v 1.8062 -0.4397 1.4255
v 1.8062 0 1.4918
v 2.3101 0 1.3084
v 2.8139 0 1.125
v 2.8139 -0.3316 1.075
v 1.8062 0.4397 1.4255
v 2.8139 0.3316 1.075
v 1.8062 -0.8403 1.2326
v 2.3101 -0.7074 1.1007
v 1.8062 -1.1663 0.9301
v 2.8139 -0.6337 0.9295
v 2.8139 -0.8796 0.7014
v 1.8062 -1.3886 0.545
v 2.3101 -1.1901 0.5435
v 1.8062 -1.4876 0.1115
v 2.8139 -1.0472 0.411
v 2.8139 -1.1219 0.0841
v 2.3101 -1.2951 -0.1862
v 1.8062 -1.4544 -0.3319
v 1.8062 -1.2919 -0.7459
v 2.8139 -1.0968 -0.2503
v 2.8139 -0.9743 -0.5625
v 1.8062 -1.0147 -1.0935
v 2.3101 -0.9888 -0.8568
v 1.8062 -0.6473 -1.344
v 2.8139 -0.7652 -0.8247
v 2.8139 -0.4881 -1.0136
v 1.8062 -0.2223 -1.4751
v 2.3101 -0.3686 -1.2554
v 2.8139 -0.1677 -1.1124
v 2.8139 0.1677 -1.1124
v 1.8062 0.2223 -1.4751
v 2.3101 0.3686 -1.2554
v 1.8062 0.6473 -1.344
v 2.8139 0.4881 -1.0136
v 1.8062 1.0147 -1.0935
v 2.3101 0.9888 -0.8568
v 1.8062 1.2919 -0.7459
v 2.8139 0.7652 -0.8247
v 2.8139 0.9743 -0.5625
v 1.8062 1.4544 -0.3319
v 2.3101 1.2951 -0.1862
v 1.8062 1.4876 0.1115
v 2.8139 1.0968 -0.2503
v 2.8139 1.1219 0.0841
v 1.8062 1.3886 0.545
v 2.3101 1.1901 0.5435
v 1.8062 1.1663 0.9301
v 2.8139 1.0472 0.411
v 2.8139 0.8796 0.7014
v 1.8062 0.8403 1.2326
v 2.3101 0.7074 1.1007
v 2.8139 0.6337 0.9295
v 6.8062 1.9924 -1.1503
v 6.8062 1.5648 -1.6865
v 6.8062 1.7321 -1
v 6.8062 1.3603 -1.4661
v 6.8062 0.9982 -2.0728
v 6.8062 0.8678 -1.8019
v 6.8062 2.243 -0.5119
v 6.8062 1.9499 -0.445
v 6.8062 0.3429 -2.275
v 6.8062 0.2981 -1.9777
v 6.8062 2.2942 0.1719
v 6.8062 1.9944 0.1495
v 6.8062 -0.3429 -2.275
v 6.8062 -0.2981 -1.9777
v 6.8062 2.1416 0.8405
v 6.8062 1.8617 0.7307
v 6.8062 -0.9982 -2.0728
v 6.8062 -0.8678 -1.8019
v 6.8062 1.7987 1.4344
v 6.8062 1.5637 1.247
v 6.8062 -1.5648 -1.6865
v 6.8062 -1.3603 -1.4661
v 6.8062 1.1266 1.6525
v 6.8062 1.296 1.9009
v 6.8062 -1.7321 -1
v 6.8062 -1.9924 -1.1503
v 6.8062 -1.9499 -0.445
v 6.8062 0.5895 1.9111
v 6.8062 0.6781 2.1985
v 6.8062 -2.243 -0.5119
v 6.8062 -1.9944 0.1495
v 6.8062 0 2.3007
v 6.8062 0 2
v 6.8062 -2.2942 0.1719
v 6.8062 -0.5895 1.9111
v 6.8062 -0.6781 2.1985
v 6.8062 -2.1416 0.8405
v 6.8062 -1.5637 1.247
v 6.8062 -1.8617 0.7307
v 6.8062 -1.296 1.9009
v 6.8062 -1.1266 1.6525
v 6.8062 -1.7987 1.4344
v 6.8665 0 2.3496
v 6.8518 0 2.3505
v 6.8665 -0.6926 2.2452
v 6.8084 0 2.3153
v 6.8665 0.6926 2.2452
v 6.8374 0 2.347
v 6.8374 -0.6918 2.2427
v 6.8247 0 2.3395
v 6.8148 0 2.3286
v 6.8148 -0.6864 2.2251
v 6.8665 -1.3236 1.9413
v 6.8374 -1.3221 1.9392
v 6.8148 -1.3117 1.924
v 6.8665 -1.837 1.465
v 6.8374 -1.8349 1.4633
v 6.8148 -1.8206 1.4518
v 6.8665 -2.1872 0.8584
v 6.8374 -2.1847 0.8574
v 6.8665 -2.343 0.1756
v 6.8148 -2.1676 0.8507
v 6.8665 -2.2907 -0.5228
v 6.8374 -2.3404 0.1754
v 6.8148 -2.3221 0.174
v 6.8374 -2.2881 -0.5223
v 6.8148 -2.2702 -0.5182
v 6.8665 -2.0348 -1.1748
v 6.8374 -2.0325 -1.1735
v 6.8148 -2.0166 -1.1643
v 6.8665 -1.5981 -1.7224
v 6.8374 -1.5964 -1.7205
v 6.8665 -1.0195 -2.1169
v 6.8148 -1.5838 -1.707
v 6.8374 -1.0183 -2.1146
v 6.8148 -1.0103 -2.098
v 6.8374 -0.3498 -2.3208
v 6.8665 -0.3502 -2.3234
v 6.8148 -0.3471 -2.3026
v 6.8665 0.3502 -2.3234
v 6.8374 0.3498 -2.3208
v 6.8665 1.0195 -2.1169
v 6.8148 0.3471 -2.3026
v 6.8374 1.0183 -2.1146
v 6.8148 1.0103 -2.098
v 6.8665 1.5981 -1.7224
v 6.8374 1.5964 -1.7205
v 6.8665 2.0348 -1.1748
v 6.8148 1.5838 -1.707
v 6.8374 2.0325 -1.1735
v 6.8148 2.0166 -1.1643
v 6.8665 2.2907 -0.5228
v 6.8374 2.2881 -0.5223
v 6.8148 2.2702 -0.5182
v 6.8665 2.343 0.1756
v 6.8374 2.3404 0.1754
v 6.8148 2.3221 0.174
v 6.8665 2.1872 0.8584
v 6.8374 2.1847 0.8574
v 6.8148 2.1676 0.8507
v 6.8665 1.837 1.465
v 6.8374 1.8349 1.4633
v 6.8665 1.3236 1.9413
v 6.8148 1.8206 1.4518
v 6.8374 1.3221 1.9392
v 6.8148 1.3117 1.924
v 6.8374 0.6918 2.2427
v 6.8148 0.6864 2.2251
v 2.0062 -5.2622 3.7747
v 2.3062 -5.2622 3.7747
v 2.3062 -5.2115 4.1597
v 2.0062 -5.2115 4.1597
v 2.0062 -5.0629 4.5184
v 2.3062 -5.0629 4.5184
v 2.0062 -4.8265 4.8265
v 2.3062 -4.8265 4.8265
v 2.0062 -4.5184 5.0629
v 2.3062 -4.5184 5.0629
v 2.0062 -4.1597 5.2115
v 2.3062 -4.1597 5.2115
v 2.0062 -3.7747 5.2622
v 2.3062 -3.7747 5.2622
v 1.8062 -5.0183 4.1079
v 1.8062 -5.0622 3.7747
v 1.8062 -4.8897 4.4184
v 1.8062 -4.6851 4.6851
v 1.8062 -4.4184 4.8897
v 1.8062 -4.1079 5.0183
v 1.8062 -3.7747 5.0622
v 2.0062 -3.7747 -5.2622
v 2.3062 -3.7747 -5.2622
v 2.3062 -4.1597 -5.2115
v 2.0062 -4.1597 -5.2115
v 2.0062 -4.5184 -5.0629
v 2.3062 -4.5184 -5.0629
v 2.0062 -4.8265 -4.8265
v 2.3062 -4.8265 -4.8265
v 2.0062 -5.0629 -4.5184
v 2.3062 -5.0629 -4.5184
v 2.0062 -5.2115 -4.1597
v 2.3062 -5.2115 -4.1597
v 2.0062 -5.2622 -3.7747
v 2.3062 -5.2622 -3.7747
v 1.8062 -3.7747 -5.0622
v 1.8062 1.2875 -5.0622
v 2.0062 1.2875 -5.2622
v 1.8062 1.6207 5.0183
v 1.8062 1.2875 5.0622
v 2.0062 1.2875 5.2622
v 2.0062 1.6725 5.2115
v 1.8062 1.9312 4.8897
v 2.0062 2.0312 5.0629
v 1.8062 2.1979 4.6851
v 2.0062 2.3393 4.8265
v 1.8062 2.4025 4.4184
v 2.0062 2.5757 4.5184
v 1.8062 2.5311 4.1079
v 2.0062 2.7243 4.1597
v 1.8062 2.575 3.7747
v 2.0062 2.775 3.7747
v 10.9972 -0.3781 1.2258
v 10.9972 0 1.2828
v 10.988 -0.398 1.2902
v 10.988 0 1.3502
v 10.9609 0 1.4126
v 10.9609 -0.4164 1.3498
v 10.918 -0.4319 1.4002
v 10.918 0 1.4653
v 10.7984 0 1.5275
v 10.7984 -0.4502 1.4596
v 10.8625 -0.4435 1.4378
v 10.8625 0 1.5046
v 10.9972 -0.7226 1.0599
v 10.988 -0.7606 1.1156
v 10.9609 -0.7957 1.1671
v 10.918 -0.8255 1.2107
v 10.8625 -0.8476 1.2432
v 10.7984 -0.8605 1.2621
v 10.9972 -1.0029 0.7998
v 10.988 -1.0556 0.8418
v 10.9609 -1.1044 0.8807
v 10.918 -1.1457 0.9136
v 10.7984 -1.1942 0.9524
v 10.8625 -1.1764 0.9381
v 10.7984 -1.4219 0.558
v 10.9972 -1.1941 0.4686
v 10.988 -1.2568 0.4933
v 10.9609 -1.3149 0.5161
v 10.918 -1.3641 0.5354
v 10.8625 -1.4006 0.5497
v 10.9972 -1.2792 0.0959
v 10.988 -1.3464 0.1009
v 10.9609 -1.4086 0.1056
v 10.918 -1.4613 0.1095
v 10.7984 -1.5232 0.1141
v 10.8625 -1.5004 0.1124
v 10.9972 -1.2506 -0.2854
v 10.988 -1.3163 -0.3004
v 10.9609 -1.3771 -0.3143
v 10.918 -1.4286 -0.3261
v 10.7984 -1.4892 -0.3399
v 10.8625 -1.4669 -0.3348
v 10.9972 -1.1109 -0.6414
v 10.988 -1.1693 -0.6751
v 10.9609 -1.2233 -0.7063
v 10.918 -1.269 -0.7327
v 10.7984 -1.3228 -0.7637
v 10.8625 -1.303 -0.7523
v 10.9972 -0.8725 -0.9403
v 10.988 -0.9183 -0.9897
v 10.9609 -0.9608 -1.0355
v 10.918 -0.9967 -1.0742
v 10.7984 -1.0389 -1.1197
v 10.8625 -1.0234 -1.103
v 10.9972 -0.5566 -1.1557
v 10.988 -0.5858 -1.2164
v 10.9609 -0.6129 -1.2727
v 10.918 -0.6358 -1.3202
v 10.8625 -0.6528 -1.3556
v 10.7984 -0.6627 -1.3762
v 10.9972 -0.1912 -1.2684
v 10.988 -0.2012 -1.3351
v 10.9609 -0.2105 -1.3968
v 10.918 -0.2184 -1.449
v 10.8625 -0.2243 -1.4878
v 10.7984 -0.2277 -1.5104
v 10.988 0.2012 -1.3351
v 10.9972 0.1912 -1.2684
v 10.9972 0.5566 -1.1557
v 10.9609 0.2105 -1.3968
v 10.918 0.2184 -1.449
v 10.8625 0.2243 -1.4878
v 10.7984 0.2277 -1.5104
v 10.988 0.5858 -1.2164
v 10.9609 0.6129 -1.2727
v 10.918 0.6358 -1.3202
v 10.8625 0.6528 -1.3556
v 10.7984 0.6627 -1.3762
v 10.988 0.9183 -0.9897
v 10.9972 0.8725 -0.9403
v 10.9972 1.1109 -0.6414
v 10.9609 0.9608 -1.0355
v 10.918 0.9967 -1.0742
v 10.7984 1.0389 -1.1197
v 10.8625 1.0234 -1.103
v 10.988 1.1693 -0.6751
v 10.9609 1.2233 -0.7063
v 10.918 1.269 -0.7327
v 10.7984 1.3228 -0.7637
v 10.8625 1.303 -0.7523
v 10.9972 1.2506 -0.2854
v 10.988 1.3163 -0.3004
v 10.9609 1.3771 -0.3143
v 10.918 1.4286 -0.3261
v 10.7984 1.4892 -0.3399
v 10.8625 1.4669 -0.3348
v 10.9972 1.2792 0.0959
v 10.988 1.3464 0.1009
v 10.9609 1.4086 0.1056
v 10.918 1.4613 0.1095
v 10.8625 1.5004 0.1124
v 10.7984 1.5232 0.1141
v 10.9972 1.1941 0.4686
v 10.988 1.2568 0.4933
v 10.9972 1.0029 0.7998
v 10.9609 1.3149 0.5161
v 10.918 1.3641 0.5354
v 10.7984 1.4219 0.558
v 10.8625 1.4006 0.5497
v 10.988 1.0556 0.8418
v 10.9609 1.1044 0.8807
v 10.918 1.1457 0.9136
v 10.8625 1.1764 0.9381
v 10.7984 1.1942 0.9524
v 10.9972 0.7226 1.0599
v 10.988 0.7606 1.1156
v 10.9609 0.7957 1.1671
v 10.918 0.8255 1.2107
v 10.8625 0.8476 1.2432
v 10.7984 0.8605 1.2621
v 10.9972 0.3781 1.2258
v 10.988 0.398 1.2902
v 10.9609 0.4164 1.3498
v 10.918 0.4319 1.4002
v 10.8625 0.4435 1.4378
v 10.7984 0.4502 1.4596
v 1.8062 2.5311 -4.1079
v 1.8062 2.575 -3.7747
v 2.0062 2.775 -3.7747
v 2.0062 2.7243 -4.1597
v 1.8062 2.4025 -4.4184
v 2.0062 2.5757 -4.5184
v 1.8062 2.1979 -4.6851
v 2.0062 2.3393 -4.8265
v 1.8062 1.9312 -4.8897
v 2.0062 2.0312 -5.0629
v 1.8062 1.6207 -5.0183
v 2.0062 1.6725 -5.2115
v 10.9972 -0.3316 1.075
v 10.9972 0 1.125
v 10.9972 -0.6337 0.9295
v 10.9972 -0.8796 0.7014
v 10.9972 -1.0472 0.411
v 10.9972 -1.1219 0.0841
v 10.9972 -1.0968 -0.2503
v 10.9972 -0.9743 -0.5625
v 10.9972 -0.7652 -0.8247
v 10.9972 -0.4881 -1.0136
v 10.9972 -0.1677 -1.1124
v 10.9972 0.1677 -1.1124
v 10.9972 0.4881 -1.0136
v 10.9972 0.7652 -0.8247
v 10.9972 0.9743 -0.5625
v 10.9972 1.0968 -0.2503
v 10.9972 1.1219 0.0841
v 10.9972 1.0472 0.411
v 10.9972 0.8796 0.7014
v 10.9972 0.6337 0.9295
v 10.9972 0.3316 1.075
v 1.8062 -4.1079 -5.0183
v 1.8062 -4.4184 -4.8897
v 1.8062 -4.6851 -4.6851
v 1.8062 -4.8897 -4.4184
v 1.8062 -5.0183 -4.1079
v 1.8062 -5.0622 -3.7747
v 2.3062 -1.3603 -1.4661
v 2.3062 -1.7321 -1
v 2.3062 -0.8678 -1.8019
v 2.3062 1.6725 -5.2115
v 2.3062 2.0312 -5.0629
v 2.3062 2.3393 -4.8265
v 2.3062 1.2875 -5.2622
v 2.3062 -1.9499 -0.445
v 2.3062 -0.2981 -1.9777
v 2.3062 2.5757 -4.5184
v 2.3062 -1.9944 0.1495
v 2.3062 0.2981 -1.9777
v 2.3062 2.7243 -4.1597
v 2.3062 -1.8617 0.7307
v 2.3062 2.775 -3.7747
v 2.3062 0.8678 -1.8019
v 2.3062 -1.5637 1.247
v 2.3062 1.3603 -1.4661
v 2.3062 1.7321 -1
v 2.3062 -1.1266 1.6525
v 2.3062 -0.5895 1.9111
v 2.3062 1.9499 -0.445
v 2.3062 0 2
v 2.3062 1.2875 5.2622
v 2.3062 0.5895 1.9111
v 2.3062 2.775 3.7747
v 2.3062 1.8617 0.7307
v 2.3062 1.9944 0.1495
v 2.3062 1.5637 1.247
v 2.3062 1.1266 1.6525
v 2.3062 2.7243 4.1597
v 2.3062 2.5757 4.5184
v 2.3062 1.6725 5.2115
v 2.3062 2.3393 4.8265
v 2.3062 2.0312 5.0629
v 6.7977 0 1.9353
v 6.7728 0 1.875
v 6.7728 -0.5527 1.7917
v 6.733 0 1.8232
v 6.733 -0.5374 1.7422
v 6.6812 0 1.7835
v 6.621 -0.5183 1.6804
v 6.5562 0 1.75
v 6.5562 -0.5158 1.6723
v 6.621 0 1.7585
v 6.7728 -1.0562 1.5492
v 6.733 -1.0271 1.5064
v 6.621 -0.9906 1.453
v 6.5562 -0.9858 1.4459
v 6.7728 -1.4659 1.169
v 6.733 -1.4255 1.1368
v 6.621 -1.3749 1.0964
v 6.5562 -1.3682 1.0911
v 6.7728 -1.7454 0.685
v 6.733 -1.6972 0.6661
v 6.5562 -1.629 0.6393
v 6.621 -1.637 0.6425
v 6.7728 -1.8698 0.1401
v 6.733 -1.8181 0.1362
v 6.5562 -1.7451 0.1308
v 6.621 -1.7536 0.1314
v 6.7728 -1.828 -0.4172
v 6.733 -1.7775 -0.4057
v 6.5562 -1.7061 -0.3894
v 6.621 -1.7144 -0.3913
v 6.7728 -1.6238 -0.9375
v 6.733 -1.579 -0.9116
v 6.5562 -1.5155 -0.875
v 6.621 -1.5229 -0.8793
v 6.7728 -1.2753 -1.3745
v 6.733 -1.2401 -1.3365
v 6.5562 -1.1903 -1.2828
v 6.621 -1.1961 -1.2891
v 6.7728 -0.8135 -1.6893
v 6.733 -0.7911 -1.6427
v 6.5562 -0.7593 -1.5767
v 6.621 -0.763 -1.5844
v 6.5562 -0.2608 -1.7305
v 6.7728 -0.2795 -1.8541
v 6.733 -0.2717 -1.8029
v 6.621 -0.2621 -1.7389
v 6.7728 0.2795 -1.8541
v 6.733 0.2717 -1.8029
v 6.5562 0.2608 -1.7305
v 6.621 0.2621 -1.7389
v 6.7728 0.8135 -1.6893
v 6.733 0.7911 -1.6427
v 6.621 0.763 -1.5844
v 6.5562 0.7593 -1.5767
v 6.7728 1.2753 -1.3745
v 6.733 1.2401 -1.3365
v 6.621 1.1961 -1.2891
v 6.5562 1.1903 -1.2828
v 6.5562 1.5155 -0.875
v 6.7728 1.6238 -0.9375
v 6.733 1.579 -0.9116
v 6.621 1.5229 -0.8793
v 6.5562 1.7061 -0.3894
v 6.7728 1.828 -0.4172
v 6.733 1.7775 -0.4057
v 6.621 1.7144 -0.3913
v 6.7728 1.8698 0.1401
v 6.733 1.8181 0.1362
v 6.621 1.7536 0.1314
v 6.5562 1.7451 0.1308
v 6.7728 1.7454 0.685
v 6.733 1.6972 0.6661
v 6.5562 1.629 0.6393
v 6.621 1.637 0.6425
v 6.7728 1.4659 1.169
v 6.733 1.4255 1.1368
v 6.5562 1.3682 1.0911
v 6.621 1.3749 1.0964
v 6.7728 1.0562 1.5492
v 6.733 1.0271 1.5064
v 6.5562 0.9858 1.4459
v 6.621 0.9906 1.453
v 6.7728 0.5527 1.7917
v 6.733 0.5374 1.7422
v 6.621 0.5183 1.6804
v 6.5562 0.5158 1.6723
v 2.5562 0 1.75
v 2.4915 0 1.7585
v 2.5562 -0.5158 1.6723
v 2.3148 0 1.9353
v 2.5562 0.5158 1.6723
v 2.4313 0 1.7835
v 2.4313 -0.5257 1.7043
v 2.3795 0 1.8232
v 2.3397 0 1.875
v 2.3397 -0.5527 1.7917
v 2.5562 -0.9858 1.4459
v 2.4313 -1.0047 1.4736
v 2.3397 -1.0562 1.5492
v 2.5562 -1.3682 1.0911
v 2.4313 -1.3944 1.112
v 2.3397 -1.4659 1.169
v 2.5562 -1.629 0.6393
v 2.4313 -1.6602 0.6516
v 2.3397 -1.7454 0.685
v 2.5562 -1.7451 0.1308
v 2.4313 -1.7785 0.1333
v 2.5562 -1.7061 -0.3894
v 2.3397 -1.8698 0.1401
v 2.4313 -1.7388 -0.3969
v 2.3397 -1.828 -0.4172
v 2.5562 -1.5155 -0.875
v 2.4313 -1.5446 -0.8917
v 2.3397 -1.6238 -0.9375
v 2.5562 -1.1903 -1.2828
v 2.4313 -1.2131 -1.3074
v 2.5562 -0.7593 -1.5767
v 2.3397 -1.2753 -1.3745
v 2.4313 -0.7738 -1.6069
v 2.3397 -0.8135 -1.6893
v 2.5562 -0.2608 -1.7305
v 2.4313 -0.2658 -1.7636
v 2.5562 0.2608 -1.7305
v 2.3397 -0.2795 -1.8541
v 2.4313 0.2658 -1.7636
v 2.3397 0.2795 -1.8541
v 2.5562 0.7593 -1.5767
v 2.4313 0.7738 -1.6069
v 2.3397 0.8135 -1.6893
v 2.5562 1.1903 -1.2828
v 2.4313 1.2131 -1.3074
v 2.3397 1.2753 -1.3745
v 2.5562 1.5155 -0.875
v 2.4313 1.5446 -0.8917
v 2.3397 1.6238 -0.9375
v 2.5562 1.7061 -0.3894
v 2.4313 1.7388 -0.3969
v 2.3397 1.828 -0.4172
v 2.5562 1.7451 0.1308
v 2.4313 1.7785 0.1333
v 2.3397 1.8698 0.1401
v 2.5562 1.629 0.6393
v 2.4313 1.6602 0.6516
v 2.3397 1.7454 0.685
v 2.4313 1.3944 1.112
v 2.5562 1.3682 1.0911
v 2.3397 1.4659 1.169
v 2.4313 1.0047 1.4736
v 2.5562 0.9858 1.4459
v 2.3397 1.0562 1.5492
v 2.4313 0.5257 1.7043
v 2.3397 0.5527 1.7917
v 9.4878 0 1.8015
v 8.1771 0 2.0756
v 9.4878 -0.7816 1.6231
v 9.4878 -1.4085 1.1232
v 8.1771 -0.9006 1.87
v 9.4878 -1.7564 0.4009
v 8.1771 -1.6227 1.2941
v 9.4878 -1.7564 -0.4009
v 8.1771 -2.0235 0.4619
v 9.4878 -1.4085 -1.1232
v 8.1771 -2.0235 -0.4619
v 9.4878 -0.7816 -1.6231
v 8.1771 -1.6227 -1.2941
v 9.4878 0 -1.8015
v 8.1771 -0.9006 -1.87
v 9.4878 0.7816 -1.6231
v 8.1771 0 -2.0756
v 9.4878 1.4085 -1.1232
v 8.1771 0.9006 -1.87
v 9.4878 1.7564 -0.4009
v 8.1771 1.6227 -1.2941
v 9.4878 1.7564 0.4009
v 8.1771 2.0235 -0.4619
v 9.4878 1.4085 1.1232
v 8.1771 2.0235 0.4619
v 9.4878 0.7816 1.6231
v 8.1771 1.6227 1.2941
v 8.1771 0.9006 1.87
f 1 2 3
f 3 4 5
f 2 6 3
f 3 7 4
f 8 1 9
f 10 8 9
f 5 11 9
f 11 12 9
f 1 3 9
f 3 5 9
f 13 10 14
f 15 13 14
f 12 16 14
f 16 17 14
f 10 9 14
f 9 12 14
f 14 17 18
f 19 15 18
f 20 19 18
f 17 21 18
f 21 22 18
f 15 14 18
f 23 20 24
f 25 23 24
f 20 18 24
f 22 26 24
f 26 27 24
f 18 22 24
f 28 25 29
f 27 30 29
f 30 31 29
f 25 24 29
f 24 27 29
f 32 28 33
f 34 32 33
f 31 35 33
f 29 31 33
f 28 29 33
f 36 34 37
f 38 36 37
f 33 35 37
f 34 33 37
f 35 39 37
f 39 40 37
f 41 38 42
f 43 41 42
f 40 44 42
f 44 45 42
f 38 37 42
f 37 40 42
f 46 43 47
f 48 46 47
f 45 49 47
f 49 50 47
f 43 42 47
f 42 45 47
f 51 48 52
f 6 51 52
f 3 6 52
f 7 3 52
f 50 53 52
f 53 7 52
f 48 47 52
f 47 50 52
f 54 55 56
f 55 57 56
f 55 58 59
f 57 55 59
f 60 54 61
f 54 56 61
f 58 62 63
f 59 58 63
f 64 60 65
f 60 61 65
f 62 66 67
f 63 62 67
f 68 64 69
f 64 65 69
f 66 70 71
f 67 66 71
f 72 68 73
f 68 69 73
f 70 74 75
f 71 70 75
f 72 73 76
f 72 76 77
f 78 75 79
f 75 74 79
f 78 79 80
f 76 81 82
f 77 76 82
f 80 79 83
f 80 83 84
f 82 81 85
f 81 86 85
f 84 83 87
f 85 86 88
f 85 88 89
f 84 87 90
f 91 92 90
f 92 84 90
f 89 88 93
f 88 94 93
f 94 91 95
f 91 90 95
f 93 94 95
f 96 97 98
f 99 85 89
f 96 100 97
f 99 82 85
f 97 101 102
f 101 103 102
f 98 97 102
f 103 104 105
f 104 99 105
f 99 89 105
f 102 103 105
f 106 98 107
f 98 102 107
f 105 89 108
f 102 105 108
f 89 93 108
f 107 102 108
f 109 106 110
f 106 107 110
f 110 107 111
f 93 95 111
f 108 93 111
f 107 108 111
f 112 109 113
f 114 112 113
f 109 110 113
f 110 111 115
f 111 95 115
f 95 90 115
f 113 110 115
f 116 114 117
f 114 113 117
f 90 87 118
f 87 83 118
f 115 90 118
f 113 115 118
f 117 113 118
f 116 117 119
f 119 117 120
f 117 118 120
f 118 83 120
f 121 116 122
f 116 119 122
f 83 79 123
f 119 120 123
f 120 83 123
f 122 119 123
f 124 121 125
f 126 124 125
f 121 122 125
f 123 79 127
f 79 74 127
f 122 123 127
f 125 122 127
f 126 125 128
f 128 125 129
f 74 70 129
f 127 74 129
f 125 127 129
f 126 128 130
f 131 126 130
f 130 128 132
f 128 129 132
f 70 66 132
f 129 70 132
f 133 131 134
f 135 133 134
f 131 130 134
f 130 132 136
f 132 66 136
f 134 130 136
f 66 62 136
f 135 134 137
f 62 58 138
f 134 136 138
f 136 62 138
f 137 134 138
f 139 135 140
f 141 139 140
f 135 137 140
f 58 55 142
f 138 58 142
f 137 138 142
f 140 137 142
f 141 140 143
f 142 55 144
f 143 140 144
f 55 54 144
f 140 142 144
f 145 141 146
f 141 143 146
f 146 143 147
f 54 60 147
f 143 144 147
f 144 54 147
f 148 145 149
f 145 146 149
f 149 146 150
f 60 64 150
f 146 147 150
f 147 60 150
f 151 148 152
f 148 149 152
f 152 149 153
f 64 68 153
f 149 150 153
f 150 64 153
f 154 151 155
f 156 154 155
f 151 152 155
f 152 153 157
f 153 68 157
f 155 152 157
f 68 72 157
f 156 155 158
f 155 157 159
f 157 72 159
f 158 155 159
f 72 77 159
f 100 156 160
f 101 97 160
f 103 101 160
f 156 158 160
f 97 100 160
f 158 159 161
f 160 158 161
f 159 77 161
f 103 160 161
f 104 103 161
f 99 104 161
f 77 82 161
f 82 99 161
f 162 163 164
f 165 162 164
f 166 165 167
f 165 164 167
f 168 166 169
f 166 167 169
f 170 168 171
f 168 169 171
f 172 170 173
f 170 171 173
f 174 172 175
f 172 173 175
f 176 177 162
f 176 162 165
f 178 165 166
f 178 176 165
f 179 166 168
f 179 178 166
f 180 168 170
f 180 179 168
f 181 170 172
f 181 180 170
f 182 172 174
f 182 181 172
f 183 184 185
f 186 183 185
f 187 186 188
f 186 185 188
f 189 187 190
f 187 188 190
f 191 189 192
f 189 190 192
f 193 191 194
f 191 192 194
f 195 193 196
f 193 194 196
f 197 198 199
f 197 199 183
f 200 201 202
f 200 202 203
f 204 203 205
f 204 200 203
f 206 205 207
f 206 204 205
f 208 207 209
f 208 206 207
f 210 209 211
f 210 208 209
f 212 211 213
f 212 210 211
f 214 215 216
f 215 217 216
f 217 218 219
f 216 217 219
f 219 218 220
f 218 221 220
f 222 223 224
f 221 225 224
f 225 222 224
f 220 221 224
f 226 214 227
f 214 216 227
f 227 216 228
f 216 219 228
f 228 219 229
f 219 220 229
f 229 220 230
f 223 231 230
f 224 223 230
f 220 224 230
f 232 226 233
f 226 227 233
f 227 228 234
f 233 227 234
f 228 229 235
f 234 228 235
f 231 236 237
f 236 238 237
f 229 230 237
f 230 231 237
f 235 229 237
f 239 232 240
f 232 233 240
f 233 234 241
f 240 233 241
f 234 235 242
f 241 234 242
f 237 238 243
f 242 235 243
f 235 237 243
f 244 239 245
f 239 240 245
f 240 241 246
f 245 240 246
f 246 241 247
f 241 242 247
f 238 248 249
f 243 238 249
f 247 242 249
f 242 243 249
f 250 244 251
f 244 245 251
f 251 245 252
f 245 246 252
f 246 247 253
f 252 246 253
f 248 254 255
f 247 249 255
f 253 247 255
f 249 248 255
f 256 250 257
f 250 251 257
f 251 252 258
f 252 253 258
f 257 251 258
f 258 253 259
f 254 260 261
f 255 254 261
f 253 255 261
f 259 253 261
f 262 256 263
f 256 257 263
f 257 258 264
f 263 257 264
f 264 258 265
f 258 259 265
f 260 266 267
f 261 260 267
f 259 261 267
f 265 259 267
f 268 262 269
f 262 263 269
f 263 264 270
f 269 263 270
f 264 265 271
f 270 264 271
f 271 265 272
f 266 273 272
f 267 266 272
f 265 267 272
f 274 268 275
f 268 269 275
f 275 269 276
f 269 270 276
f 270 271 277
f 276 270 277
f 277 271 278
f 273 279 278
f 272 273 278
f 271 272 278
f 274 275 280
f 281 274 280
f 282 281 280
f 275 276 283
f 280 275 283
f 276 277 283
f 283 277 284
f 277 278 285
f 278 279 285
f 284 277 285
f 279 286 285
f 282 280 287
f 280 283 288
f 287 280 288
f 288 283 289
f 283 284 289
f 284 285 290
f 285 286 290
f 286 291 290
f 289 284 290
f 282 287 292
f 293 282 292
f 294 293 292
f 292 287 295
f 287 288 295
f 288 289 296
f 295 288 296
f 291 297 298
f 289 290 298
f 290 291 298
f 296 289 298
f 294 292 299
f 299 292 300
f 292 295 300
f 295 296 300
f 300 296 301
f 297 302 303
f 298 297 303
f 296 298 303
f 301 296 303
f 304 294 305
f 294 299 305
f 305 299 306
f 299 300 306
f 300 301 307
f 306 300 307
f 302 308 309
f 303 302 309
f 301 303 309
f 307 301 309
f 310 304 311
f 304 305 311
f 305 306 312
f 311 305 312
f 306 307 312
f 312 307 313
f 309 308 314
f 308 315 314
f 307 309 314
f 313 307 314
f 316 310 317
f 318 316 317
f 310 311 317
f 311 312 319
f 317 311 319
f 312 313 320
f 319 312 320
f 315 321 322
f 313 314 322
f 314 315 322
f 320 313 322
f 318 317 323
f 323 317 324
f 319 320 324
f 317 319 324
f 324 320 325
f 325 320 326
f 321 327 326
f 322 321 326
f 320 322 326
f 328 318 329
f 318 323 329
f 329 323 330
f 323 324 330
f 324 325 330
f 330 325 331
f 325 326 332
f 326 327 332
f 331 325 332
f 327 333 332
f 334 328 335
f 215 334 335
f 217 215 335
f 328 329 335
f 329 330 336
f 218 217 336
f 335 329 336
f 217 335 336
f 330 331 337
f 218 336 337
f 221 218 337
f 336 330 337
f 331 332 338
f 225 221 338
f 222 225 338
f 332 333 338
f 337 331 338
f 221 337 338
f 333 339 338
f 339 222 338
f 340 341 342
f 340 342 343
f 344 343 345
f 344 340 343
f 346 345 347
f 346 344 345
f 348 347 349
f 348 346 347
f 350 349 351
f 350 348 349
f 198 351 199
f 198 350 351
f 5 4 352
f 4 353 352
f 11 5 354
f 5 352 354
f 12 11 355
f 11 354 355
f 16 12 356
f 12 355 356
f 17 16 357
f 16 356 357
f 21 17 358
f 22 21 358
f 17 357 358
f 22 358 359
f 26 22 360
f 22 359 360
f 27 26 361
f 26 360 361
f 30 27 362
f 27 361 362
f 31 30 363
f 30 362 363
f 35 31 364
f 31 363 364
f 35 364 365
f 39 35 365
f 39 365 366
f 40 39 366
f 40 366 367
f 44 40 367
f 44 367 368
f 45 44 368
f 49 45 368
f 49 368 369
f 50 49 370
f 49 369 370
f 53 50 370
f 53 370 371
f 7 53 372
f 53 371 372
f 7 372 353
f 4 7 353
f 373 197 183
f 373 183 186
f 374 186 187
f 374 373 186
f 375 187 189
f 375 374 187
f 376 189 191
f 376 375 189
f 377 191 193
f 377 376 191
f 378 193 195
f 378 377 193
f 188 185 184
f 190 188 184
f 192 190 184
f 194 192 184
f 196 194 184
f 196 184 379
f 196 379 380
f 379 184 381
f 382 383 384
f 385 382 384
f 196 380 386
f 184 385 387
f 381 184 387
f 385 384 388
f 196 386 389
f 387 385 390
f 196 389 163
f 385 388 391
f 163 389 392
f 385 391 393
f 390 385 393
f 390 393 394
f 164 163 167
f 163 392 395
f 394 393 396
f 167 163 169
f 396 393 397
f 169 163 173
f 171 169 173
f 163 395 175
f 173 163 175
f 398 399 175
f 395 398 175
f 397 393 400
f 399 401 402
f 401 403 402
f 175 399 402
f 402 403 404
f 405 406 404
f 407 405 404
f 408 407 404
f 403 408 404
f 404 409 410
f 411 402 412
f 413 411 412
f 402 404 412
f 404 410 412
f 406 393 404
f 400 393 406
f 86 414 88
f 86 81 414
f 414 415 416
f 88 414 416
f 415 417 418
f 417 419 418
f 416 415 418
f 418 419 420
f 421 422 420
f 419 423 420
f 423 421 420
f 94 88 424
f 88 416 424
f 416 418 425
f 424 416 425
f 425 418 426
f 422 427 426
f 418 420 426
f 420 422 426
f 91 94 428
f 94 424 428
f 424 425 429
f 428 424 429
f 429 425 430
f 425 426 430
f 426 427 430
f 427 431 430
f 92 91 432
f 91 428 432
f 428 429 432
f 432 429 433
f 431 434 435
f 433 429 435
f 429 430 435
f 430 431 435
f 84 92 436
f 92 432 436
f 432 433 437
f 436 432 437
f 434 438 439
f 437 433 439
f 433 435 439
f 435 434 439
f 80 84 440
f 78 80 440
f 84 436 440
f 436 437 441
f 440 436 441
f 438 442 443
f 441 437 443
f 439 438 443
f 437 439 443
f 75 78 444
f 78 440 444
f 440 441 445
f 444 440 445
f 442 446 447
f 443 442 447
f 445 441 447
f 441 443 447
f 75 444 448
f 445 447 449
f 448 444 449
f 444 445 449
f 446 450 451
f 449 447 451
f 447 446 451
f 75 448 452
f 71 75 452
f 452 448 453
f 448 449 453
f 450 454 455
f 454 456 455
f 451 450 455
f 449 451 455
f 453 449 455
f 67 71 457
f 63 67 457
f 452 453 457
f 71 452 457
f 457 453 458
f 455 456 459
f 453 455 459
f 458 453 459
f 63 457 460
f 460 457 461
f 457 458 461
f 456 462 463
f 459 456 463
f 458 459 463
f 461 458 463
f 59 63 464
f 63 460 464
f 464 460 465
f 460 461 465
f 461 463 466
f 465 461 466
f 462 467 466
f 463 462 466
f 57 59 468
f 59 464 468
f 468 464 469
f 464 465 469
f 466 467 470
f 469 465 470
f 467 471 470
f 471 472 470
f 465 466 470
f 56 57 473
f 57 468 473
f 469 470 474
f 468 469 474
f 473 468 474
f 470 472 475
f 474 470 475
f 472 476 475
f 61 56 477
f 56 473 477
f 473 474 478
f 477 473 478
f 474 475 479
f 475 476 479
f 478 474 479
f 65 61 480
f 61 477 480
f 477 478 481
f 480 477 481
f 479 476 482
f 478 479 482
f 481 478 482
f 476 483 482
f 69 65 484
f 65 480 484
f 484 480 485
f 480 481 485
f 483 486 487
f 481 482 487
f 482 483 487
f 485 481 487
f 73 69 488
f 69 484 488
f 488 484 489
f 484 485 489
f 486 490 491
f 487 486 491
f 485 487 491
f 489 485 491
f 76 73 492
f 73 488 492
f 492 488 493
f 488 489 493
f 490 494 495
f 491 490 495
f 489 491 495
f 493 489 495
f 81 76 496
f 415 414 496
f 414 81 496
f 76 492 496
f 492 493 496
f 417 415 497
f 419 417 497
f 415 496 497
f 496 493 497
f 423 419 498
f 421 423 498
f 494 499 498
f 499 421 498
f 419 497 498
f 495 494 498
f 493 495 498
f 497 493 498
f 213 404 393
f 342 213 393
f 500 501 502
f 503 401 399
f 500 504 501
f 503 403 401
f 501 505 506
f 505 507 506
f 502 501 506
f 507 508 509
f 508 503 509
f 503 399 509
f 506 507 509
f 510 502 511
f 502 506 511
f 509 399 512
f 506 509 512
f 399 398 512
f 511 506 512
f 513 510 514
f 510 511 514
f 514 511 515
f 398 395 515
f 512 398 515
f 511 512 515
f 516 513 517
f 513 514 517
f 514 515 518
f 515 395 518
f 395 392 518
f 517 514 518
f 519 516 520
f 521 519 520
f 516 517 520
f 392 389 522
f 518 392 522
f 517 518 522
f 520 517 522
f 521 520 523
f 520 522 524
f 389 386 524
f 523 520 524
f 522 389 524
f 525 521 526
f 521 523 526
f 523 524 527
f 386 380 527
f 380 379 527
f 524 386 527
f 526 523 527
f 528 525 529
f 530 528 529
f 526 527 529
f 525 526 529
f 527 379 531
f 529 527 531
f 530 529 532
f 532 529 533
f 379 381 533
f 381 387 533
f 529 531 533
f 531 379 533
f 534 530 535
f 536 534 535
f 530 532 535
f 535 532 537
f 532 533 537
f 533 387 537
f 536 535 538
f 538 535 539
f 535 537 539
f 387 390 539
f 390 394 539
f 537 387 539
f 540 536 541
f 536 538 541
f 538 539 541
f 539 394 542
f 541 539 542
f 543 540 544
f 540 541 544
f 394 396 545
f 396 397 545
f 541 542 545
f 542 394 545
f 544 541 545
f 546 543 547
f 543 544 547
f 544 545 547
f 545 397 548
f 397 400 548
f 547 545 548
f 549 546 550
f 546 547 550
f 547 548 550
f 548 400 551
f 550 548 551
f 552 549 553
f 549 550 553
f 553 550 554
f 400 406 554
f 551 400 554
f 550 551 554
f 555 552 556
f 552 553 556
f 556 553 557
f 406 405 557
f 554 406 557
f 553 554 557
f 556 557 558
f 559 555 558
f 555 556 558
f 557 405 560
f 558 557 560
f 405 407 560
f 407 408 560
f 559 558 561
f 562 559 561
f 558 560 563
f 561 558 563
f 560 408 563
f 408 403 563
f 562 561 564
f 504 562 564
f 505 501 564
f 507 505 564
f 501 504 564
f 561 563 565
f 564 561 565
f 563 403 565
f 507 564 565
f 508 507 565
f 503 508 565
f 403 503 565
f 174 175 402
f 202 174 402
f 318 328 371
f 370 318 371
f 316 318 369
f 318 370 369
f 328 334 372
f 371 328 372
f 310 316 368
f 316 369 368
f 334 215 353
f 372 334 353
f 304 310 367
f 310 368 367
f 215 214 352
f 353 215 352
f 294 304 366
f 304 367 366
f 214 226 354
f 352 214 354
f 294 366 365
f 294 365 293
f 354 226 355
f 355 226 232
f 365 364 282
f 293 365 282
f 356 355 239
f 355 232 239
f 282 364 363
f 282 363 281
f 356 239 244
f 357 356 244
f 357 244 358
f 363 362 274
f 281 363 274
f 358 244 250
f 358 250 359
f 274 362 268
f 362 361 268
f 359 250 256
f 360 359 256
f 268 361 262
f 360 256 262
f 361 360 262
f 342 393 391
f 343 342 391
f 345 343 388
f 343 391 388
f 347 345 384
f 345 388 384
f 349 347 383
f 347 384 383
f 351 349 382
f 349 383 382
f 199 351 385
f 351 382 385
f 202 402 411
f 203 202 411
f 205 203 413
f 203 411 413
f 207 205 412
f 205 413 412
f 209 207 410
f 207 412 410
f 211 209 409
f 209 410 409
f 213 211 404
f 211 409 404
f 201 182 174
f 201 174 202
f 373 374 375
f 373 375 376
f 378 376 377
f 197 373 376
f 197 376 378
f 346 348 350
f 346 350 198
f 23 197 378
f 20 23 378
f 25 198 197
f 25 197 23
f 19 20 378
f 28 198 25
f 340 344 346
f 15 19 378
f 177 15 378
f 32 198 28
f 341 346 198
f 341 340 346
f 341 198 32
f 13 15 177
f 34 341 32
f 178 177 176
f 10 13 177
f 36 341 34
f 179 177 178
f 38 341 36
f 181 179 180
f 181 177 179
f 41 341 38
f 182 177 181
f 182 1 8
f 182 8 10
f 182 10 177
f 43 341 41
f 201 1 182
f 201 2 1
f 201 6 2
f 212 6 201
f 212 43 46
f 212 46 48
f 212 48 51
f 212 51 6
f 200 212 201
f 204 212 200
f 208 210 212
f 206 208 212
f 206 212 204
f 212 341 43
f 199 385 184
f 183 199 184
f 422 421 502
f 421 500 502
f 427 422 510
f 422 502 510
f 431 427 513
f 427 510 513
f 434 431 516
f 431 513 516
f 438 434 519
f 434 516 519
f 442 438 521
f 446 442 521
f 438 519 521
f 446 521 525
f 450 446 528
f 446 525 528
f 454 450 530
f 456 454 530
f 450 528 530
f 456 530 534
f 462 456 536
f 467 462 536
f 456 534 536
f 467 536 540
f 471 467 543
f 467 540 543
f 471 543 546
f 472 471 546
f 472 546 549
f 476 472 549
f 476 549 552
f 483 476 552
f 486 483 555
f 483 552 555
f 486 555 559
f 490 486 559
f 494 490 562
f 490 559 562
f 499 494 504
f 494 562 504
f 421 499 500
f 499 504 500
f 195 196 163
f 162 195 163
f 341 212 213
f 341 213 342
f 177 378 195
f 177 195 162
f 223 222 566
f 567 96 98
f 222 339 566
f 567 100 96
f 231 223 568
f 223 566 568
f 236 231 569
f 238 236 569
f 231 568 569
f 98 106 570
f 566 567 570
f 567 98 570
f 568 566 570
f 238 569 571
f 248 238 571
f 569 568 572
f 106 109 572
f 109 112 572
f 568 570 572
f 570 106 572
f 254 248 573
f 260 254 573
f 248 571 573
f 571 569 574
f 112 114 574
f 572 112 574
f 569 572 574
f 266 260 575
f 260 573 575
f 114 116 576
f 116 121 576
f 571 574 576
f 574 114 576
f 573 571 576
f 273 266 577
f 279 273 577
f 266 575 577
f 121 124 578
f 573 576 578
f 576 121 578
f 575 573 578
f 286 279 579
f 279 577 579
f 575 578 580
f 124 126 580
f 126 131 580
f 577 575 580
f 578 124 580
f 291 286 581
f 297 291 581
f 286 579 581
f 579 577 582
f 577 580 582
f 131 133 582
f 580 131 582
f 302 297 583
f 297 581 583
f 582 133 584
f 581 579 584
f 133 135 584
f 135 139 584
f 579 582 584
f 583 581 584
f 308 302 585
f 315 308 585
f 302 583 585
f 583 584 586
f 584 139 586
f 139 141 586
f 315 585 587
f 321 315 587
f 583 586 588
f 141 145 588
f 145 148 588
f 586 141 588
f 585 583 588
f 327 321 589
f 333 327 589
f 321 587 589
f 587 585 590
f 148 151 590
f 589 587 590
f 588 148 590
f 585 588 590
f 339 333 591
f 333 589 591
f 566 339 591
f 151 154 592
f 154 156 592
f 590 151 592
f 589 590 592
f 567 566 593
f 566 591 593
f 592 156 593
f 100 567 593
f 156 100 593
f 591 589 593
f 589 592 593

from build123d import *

# Parameters (mm, degrees)
SKETCH20_R          = 2.350664171
BOSS_EXTRUDE1_DEPTH = 0.5
CHAMFER1_SIZE       = 0.2


with BuildPart() as part:
    # Sketch19 → Revolve1 (revolve)
    with BuildSketch(Plane.XY, mode=Mode.PRIVATE) as revolve1_sk:
        with BuildLine():
            Line((1.80625, 1.491762035), (2.813920411, 1.125))
            Line((2.813920411, 1.125), (10.99725, 1.125))
            Line((10.99725, 1.125), (10.99725, 1.28276631))
            ThreePointArc((10.99725, 1.28276631), (10.941275199, 1.440418529), (10.798416223, 1.527474335))
            Line((10.798416223, 1.527474335), (6.866483245, 2.349605776))
            ThreePointArc((6.866483245, 2.349605776), (6.824719556, 2.339469211), (6.80625, 2.300664171))
            Line((6.80625, 2.300664171), (6.80625, 2))
            ThreePointArc((6.80625, 2), (6.733026695, 1.823223305), (6.55625, 1.75))
            Line((6.55625, 1.75), (2.55625, 1.75))
            ThreePointArc((2.55625, 1.75), (2.379473305, 1.823223305), (2.30625, 2))
            Line((2.30625, 2), (2.30625, 2.75))
            Line((2.30625, 2.75), (1.80625, 2.75))
            Line((1.80625, 2.75), (1.80625, 1.491762035))
        make_face()
    revolve(revolve1_sk.sketch.rotate(Axis((0, 0, 0), (1, 0, 0)), 90), axis=Axis((0, 0, 0), (1, 0, 0)))  # turned: the seam where the file's is

    # Sketch20 → Boss-Extrude1 (add)
    with BuildSketch(Plane(origin=(2.30625, 0, 0), x_dir=(0, 0, -1), z_dir=(1, 0, 0))):
        with BuildLine():
            Line((-3.7747, 2.775), (3.7747, 2.775))
            ThreePointArc((3.7747, 2.775), (4.826521337, 2.339321337), (5.2622, 1.2875))
            Line((5.2622, 1.2875), (5.2622, -3.7747))
            ThreePointArc((5.2622, -3.7747), (4.826521337, -4.826521337), (3.7747, -5.2622))
            Line((3.7747, -5.2622), (-3.7747, -5.2622))
            ThreePointArc((-3.7747, -5.2622), (-4.826521337, -4.826521337), (-5.2622, -3.7747))
            Line((-5.2622, -3.7747), (-5.2622, 1.2875))
            ThreePointArc((-5.2622, 1.2875), (-4.826521337, 2.339321337), (-3.7747, 2.775))
        make_face()
        Circle(SKETCH20_R, mode=Mode.SUBTRACT)
    extrude(amount=-BOSS_EXTRUDE1_DEPTH)

    # Chamfer1
    chamfer1_edges = [part.edges().sort_by_distance(p)[0] for p in [
        (1.80625, 2.339321337, -4.826521337),
        (1.80625, -1.2436, -5.2622),
        (1.80625, -4.826521337, -4.826521337),
        (1.80625, -5.2622, 0),
        (1.80625, -4.826521337, 4.826521337),
        (1.80625, -1.2436, 5.2622),
        (1.80625, 2.339321337, 4.826521337),
        (1.80625, 2.775, 0),
    ]]
    chamfer(chamfer1_edges, length=CHAMFER1_SIZE)


solid = part.part
